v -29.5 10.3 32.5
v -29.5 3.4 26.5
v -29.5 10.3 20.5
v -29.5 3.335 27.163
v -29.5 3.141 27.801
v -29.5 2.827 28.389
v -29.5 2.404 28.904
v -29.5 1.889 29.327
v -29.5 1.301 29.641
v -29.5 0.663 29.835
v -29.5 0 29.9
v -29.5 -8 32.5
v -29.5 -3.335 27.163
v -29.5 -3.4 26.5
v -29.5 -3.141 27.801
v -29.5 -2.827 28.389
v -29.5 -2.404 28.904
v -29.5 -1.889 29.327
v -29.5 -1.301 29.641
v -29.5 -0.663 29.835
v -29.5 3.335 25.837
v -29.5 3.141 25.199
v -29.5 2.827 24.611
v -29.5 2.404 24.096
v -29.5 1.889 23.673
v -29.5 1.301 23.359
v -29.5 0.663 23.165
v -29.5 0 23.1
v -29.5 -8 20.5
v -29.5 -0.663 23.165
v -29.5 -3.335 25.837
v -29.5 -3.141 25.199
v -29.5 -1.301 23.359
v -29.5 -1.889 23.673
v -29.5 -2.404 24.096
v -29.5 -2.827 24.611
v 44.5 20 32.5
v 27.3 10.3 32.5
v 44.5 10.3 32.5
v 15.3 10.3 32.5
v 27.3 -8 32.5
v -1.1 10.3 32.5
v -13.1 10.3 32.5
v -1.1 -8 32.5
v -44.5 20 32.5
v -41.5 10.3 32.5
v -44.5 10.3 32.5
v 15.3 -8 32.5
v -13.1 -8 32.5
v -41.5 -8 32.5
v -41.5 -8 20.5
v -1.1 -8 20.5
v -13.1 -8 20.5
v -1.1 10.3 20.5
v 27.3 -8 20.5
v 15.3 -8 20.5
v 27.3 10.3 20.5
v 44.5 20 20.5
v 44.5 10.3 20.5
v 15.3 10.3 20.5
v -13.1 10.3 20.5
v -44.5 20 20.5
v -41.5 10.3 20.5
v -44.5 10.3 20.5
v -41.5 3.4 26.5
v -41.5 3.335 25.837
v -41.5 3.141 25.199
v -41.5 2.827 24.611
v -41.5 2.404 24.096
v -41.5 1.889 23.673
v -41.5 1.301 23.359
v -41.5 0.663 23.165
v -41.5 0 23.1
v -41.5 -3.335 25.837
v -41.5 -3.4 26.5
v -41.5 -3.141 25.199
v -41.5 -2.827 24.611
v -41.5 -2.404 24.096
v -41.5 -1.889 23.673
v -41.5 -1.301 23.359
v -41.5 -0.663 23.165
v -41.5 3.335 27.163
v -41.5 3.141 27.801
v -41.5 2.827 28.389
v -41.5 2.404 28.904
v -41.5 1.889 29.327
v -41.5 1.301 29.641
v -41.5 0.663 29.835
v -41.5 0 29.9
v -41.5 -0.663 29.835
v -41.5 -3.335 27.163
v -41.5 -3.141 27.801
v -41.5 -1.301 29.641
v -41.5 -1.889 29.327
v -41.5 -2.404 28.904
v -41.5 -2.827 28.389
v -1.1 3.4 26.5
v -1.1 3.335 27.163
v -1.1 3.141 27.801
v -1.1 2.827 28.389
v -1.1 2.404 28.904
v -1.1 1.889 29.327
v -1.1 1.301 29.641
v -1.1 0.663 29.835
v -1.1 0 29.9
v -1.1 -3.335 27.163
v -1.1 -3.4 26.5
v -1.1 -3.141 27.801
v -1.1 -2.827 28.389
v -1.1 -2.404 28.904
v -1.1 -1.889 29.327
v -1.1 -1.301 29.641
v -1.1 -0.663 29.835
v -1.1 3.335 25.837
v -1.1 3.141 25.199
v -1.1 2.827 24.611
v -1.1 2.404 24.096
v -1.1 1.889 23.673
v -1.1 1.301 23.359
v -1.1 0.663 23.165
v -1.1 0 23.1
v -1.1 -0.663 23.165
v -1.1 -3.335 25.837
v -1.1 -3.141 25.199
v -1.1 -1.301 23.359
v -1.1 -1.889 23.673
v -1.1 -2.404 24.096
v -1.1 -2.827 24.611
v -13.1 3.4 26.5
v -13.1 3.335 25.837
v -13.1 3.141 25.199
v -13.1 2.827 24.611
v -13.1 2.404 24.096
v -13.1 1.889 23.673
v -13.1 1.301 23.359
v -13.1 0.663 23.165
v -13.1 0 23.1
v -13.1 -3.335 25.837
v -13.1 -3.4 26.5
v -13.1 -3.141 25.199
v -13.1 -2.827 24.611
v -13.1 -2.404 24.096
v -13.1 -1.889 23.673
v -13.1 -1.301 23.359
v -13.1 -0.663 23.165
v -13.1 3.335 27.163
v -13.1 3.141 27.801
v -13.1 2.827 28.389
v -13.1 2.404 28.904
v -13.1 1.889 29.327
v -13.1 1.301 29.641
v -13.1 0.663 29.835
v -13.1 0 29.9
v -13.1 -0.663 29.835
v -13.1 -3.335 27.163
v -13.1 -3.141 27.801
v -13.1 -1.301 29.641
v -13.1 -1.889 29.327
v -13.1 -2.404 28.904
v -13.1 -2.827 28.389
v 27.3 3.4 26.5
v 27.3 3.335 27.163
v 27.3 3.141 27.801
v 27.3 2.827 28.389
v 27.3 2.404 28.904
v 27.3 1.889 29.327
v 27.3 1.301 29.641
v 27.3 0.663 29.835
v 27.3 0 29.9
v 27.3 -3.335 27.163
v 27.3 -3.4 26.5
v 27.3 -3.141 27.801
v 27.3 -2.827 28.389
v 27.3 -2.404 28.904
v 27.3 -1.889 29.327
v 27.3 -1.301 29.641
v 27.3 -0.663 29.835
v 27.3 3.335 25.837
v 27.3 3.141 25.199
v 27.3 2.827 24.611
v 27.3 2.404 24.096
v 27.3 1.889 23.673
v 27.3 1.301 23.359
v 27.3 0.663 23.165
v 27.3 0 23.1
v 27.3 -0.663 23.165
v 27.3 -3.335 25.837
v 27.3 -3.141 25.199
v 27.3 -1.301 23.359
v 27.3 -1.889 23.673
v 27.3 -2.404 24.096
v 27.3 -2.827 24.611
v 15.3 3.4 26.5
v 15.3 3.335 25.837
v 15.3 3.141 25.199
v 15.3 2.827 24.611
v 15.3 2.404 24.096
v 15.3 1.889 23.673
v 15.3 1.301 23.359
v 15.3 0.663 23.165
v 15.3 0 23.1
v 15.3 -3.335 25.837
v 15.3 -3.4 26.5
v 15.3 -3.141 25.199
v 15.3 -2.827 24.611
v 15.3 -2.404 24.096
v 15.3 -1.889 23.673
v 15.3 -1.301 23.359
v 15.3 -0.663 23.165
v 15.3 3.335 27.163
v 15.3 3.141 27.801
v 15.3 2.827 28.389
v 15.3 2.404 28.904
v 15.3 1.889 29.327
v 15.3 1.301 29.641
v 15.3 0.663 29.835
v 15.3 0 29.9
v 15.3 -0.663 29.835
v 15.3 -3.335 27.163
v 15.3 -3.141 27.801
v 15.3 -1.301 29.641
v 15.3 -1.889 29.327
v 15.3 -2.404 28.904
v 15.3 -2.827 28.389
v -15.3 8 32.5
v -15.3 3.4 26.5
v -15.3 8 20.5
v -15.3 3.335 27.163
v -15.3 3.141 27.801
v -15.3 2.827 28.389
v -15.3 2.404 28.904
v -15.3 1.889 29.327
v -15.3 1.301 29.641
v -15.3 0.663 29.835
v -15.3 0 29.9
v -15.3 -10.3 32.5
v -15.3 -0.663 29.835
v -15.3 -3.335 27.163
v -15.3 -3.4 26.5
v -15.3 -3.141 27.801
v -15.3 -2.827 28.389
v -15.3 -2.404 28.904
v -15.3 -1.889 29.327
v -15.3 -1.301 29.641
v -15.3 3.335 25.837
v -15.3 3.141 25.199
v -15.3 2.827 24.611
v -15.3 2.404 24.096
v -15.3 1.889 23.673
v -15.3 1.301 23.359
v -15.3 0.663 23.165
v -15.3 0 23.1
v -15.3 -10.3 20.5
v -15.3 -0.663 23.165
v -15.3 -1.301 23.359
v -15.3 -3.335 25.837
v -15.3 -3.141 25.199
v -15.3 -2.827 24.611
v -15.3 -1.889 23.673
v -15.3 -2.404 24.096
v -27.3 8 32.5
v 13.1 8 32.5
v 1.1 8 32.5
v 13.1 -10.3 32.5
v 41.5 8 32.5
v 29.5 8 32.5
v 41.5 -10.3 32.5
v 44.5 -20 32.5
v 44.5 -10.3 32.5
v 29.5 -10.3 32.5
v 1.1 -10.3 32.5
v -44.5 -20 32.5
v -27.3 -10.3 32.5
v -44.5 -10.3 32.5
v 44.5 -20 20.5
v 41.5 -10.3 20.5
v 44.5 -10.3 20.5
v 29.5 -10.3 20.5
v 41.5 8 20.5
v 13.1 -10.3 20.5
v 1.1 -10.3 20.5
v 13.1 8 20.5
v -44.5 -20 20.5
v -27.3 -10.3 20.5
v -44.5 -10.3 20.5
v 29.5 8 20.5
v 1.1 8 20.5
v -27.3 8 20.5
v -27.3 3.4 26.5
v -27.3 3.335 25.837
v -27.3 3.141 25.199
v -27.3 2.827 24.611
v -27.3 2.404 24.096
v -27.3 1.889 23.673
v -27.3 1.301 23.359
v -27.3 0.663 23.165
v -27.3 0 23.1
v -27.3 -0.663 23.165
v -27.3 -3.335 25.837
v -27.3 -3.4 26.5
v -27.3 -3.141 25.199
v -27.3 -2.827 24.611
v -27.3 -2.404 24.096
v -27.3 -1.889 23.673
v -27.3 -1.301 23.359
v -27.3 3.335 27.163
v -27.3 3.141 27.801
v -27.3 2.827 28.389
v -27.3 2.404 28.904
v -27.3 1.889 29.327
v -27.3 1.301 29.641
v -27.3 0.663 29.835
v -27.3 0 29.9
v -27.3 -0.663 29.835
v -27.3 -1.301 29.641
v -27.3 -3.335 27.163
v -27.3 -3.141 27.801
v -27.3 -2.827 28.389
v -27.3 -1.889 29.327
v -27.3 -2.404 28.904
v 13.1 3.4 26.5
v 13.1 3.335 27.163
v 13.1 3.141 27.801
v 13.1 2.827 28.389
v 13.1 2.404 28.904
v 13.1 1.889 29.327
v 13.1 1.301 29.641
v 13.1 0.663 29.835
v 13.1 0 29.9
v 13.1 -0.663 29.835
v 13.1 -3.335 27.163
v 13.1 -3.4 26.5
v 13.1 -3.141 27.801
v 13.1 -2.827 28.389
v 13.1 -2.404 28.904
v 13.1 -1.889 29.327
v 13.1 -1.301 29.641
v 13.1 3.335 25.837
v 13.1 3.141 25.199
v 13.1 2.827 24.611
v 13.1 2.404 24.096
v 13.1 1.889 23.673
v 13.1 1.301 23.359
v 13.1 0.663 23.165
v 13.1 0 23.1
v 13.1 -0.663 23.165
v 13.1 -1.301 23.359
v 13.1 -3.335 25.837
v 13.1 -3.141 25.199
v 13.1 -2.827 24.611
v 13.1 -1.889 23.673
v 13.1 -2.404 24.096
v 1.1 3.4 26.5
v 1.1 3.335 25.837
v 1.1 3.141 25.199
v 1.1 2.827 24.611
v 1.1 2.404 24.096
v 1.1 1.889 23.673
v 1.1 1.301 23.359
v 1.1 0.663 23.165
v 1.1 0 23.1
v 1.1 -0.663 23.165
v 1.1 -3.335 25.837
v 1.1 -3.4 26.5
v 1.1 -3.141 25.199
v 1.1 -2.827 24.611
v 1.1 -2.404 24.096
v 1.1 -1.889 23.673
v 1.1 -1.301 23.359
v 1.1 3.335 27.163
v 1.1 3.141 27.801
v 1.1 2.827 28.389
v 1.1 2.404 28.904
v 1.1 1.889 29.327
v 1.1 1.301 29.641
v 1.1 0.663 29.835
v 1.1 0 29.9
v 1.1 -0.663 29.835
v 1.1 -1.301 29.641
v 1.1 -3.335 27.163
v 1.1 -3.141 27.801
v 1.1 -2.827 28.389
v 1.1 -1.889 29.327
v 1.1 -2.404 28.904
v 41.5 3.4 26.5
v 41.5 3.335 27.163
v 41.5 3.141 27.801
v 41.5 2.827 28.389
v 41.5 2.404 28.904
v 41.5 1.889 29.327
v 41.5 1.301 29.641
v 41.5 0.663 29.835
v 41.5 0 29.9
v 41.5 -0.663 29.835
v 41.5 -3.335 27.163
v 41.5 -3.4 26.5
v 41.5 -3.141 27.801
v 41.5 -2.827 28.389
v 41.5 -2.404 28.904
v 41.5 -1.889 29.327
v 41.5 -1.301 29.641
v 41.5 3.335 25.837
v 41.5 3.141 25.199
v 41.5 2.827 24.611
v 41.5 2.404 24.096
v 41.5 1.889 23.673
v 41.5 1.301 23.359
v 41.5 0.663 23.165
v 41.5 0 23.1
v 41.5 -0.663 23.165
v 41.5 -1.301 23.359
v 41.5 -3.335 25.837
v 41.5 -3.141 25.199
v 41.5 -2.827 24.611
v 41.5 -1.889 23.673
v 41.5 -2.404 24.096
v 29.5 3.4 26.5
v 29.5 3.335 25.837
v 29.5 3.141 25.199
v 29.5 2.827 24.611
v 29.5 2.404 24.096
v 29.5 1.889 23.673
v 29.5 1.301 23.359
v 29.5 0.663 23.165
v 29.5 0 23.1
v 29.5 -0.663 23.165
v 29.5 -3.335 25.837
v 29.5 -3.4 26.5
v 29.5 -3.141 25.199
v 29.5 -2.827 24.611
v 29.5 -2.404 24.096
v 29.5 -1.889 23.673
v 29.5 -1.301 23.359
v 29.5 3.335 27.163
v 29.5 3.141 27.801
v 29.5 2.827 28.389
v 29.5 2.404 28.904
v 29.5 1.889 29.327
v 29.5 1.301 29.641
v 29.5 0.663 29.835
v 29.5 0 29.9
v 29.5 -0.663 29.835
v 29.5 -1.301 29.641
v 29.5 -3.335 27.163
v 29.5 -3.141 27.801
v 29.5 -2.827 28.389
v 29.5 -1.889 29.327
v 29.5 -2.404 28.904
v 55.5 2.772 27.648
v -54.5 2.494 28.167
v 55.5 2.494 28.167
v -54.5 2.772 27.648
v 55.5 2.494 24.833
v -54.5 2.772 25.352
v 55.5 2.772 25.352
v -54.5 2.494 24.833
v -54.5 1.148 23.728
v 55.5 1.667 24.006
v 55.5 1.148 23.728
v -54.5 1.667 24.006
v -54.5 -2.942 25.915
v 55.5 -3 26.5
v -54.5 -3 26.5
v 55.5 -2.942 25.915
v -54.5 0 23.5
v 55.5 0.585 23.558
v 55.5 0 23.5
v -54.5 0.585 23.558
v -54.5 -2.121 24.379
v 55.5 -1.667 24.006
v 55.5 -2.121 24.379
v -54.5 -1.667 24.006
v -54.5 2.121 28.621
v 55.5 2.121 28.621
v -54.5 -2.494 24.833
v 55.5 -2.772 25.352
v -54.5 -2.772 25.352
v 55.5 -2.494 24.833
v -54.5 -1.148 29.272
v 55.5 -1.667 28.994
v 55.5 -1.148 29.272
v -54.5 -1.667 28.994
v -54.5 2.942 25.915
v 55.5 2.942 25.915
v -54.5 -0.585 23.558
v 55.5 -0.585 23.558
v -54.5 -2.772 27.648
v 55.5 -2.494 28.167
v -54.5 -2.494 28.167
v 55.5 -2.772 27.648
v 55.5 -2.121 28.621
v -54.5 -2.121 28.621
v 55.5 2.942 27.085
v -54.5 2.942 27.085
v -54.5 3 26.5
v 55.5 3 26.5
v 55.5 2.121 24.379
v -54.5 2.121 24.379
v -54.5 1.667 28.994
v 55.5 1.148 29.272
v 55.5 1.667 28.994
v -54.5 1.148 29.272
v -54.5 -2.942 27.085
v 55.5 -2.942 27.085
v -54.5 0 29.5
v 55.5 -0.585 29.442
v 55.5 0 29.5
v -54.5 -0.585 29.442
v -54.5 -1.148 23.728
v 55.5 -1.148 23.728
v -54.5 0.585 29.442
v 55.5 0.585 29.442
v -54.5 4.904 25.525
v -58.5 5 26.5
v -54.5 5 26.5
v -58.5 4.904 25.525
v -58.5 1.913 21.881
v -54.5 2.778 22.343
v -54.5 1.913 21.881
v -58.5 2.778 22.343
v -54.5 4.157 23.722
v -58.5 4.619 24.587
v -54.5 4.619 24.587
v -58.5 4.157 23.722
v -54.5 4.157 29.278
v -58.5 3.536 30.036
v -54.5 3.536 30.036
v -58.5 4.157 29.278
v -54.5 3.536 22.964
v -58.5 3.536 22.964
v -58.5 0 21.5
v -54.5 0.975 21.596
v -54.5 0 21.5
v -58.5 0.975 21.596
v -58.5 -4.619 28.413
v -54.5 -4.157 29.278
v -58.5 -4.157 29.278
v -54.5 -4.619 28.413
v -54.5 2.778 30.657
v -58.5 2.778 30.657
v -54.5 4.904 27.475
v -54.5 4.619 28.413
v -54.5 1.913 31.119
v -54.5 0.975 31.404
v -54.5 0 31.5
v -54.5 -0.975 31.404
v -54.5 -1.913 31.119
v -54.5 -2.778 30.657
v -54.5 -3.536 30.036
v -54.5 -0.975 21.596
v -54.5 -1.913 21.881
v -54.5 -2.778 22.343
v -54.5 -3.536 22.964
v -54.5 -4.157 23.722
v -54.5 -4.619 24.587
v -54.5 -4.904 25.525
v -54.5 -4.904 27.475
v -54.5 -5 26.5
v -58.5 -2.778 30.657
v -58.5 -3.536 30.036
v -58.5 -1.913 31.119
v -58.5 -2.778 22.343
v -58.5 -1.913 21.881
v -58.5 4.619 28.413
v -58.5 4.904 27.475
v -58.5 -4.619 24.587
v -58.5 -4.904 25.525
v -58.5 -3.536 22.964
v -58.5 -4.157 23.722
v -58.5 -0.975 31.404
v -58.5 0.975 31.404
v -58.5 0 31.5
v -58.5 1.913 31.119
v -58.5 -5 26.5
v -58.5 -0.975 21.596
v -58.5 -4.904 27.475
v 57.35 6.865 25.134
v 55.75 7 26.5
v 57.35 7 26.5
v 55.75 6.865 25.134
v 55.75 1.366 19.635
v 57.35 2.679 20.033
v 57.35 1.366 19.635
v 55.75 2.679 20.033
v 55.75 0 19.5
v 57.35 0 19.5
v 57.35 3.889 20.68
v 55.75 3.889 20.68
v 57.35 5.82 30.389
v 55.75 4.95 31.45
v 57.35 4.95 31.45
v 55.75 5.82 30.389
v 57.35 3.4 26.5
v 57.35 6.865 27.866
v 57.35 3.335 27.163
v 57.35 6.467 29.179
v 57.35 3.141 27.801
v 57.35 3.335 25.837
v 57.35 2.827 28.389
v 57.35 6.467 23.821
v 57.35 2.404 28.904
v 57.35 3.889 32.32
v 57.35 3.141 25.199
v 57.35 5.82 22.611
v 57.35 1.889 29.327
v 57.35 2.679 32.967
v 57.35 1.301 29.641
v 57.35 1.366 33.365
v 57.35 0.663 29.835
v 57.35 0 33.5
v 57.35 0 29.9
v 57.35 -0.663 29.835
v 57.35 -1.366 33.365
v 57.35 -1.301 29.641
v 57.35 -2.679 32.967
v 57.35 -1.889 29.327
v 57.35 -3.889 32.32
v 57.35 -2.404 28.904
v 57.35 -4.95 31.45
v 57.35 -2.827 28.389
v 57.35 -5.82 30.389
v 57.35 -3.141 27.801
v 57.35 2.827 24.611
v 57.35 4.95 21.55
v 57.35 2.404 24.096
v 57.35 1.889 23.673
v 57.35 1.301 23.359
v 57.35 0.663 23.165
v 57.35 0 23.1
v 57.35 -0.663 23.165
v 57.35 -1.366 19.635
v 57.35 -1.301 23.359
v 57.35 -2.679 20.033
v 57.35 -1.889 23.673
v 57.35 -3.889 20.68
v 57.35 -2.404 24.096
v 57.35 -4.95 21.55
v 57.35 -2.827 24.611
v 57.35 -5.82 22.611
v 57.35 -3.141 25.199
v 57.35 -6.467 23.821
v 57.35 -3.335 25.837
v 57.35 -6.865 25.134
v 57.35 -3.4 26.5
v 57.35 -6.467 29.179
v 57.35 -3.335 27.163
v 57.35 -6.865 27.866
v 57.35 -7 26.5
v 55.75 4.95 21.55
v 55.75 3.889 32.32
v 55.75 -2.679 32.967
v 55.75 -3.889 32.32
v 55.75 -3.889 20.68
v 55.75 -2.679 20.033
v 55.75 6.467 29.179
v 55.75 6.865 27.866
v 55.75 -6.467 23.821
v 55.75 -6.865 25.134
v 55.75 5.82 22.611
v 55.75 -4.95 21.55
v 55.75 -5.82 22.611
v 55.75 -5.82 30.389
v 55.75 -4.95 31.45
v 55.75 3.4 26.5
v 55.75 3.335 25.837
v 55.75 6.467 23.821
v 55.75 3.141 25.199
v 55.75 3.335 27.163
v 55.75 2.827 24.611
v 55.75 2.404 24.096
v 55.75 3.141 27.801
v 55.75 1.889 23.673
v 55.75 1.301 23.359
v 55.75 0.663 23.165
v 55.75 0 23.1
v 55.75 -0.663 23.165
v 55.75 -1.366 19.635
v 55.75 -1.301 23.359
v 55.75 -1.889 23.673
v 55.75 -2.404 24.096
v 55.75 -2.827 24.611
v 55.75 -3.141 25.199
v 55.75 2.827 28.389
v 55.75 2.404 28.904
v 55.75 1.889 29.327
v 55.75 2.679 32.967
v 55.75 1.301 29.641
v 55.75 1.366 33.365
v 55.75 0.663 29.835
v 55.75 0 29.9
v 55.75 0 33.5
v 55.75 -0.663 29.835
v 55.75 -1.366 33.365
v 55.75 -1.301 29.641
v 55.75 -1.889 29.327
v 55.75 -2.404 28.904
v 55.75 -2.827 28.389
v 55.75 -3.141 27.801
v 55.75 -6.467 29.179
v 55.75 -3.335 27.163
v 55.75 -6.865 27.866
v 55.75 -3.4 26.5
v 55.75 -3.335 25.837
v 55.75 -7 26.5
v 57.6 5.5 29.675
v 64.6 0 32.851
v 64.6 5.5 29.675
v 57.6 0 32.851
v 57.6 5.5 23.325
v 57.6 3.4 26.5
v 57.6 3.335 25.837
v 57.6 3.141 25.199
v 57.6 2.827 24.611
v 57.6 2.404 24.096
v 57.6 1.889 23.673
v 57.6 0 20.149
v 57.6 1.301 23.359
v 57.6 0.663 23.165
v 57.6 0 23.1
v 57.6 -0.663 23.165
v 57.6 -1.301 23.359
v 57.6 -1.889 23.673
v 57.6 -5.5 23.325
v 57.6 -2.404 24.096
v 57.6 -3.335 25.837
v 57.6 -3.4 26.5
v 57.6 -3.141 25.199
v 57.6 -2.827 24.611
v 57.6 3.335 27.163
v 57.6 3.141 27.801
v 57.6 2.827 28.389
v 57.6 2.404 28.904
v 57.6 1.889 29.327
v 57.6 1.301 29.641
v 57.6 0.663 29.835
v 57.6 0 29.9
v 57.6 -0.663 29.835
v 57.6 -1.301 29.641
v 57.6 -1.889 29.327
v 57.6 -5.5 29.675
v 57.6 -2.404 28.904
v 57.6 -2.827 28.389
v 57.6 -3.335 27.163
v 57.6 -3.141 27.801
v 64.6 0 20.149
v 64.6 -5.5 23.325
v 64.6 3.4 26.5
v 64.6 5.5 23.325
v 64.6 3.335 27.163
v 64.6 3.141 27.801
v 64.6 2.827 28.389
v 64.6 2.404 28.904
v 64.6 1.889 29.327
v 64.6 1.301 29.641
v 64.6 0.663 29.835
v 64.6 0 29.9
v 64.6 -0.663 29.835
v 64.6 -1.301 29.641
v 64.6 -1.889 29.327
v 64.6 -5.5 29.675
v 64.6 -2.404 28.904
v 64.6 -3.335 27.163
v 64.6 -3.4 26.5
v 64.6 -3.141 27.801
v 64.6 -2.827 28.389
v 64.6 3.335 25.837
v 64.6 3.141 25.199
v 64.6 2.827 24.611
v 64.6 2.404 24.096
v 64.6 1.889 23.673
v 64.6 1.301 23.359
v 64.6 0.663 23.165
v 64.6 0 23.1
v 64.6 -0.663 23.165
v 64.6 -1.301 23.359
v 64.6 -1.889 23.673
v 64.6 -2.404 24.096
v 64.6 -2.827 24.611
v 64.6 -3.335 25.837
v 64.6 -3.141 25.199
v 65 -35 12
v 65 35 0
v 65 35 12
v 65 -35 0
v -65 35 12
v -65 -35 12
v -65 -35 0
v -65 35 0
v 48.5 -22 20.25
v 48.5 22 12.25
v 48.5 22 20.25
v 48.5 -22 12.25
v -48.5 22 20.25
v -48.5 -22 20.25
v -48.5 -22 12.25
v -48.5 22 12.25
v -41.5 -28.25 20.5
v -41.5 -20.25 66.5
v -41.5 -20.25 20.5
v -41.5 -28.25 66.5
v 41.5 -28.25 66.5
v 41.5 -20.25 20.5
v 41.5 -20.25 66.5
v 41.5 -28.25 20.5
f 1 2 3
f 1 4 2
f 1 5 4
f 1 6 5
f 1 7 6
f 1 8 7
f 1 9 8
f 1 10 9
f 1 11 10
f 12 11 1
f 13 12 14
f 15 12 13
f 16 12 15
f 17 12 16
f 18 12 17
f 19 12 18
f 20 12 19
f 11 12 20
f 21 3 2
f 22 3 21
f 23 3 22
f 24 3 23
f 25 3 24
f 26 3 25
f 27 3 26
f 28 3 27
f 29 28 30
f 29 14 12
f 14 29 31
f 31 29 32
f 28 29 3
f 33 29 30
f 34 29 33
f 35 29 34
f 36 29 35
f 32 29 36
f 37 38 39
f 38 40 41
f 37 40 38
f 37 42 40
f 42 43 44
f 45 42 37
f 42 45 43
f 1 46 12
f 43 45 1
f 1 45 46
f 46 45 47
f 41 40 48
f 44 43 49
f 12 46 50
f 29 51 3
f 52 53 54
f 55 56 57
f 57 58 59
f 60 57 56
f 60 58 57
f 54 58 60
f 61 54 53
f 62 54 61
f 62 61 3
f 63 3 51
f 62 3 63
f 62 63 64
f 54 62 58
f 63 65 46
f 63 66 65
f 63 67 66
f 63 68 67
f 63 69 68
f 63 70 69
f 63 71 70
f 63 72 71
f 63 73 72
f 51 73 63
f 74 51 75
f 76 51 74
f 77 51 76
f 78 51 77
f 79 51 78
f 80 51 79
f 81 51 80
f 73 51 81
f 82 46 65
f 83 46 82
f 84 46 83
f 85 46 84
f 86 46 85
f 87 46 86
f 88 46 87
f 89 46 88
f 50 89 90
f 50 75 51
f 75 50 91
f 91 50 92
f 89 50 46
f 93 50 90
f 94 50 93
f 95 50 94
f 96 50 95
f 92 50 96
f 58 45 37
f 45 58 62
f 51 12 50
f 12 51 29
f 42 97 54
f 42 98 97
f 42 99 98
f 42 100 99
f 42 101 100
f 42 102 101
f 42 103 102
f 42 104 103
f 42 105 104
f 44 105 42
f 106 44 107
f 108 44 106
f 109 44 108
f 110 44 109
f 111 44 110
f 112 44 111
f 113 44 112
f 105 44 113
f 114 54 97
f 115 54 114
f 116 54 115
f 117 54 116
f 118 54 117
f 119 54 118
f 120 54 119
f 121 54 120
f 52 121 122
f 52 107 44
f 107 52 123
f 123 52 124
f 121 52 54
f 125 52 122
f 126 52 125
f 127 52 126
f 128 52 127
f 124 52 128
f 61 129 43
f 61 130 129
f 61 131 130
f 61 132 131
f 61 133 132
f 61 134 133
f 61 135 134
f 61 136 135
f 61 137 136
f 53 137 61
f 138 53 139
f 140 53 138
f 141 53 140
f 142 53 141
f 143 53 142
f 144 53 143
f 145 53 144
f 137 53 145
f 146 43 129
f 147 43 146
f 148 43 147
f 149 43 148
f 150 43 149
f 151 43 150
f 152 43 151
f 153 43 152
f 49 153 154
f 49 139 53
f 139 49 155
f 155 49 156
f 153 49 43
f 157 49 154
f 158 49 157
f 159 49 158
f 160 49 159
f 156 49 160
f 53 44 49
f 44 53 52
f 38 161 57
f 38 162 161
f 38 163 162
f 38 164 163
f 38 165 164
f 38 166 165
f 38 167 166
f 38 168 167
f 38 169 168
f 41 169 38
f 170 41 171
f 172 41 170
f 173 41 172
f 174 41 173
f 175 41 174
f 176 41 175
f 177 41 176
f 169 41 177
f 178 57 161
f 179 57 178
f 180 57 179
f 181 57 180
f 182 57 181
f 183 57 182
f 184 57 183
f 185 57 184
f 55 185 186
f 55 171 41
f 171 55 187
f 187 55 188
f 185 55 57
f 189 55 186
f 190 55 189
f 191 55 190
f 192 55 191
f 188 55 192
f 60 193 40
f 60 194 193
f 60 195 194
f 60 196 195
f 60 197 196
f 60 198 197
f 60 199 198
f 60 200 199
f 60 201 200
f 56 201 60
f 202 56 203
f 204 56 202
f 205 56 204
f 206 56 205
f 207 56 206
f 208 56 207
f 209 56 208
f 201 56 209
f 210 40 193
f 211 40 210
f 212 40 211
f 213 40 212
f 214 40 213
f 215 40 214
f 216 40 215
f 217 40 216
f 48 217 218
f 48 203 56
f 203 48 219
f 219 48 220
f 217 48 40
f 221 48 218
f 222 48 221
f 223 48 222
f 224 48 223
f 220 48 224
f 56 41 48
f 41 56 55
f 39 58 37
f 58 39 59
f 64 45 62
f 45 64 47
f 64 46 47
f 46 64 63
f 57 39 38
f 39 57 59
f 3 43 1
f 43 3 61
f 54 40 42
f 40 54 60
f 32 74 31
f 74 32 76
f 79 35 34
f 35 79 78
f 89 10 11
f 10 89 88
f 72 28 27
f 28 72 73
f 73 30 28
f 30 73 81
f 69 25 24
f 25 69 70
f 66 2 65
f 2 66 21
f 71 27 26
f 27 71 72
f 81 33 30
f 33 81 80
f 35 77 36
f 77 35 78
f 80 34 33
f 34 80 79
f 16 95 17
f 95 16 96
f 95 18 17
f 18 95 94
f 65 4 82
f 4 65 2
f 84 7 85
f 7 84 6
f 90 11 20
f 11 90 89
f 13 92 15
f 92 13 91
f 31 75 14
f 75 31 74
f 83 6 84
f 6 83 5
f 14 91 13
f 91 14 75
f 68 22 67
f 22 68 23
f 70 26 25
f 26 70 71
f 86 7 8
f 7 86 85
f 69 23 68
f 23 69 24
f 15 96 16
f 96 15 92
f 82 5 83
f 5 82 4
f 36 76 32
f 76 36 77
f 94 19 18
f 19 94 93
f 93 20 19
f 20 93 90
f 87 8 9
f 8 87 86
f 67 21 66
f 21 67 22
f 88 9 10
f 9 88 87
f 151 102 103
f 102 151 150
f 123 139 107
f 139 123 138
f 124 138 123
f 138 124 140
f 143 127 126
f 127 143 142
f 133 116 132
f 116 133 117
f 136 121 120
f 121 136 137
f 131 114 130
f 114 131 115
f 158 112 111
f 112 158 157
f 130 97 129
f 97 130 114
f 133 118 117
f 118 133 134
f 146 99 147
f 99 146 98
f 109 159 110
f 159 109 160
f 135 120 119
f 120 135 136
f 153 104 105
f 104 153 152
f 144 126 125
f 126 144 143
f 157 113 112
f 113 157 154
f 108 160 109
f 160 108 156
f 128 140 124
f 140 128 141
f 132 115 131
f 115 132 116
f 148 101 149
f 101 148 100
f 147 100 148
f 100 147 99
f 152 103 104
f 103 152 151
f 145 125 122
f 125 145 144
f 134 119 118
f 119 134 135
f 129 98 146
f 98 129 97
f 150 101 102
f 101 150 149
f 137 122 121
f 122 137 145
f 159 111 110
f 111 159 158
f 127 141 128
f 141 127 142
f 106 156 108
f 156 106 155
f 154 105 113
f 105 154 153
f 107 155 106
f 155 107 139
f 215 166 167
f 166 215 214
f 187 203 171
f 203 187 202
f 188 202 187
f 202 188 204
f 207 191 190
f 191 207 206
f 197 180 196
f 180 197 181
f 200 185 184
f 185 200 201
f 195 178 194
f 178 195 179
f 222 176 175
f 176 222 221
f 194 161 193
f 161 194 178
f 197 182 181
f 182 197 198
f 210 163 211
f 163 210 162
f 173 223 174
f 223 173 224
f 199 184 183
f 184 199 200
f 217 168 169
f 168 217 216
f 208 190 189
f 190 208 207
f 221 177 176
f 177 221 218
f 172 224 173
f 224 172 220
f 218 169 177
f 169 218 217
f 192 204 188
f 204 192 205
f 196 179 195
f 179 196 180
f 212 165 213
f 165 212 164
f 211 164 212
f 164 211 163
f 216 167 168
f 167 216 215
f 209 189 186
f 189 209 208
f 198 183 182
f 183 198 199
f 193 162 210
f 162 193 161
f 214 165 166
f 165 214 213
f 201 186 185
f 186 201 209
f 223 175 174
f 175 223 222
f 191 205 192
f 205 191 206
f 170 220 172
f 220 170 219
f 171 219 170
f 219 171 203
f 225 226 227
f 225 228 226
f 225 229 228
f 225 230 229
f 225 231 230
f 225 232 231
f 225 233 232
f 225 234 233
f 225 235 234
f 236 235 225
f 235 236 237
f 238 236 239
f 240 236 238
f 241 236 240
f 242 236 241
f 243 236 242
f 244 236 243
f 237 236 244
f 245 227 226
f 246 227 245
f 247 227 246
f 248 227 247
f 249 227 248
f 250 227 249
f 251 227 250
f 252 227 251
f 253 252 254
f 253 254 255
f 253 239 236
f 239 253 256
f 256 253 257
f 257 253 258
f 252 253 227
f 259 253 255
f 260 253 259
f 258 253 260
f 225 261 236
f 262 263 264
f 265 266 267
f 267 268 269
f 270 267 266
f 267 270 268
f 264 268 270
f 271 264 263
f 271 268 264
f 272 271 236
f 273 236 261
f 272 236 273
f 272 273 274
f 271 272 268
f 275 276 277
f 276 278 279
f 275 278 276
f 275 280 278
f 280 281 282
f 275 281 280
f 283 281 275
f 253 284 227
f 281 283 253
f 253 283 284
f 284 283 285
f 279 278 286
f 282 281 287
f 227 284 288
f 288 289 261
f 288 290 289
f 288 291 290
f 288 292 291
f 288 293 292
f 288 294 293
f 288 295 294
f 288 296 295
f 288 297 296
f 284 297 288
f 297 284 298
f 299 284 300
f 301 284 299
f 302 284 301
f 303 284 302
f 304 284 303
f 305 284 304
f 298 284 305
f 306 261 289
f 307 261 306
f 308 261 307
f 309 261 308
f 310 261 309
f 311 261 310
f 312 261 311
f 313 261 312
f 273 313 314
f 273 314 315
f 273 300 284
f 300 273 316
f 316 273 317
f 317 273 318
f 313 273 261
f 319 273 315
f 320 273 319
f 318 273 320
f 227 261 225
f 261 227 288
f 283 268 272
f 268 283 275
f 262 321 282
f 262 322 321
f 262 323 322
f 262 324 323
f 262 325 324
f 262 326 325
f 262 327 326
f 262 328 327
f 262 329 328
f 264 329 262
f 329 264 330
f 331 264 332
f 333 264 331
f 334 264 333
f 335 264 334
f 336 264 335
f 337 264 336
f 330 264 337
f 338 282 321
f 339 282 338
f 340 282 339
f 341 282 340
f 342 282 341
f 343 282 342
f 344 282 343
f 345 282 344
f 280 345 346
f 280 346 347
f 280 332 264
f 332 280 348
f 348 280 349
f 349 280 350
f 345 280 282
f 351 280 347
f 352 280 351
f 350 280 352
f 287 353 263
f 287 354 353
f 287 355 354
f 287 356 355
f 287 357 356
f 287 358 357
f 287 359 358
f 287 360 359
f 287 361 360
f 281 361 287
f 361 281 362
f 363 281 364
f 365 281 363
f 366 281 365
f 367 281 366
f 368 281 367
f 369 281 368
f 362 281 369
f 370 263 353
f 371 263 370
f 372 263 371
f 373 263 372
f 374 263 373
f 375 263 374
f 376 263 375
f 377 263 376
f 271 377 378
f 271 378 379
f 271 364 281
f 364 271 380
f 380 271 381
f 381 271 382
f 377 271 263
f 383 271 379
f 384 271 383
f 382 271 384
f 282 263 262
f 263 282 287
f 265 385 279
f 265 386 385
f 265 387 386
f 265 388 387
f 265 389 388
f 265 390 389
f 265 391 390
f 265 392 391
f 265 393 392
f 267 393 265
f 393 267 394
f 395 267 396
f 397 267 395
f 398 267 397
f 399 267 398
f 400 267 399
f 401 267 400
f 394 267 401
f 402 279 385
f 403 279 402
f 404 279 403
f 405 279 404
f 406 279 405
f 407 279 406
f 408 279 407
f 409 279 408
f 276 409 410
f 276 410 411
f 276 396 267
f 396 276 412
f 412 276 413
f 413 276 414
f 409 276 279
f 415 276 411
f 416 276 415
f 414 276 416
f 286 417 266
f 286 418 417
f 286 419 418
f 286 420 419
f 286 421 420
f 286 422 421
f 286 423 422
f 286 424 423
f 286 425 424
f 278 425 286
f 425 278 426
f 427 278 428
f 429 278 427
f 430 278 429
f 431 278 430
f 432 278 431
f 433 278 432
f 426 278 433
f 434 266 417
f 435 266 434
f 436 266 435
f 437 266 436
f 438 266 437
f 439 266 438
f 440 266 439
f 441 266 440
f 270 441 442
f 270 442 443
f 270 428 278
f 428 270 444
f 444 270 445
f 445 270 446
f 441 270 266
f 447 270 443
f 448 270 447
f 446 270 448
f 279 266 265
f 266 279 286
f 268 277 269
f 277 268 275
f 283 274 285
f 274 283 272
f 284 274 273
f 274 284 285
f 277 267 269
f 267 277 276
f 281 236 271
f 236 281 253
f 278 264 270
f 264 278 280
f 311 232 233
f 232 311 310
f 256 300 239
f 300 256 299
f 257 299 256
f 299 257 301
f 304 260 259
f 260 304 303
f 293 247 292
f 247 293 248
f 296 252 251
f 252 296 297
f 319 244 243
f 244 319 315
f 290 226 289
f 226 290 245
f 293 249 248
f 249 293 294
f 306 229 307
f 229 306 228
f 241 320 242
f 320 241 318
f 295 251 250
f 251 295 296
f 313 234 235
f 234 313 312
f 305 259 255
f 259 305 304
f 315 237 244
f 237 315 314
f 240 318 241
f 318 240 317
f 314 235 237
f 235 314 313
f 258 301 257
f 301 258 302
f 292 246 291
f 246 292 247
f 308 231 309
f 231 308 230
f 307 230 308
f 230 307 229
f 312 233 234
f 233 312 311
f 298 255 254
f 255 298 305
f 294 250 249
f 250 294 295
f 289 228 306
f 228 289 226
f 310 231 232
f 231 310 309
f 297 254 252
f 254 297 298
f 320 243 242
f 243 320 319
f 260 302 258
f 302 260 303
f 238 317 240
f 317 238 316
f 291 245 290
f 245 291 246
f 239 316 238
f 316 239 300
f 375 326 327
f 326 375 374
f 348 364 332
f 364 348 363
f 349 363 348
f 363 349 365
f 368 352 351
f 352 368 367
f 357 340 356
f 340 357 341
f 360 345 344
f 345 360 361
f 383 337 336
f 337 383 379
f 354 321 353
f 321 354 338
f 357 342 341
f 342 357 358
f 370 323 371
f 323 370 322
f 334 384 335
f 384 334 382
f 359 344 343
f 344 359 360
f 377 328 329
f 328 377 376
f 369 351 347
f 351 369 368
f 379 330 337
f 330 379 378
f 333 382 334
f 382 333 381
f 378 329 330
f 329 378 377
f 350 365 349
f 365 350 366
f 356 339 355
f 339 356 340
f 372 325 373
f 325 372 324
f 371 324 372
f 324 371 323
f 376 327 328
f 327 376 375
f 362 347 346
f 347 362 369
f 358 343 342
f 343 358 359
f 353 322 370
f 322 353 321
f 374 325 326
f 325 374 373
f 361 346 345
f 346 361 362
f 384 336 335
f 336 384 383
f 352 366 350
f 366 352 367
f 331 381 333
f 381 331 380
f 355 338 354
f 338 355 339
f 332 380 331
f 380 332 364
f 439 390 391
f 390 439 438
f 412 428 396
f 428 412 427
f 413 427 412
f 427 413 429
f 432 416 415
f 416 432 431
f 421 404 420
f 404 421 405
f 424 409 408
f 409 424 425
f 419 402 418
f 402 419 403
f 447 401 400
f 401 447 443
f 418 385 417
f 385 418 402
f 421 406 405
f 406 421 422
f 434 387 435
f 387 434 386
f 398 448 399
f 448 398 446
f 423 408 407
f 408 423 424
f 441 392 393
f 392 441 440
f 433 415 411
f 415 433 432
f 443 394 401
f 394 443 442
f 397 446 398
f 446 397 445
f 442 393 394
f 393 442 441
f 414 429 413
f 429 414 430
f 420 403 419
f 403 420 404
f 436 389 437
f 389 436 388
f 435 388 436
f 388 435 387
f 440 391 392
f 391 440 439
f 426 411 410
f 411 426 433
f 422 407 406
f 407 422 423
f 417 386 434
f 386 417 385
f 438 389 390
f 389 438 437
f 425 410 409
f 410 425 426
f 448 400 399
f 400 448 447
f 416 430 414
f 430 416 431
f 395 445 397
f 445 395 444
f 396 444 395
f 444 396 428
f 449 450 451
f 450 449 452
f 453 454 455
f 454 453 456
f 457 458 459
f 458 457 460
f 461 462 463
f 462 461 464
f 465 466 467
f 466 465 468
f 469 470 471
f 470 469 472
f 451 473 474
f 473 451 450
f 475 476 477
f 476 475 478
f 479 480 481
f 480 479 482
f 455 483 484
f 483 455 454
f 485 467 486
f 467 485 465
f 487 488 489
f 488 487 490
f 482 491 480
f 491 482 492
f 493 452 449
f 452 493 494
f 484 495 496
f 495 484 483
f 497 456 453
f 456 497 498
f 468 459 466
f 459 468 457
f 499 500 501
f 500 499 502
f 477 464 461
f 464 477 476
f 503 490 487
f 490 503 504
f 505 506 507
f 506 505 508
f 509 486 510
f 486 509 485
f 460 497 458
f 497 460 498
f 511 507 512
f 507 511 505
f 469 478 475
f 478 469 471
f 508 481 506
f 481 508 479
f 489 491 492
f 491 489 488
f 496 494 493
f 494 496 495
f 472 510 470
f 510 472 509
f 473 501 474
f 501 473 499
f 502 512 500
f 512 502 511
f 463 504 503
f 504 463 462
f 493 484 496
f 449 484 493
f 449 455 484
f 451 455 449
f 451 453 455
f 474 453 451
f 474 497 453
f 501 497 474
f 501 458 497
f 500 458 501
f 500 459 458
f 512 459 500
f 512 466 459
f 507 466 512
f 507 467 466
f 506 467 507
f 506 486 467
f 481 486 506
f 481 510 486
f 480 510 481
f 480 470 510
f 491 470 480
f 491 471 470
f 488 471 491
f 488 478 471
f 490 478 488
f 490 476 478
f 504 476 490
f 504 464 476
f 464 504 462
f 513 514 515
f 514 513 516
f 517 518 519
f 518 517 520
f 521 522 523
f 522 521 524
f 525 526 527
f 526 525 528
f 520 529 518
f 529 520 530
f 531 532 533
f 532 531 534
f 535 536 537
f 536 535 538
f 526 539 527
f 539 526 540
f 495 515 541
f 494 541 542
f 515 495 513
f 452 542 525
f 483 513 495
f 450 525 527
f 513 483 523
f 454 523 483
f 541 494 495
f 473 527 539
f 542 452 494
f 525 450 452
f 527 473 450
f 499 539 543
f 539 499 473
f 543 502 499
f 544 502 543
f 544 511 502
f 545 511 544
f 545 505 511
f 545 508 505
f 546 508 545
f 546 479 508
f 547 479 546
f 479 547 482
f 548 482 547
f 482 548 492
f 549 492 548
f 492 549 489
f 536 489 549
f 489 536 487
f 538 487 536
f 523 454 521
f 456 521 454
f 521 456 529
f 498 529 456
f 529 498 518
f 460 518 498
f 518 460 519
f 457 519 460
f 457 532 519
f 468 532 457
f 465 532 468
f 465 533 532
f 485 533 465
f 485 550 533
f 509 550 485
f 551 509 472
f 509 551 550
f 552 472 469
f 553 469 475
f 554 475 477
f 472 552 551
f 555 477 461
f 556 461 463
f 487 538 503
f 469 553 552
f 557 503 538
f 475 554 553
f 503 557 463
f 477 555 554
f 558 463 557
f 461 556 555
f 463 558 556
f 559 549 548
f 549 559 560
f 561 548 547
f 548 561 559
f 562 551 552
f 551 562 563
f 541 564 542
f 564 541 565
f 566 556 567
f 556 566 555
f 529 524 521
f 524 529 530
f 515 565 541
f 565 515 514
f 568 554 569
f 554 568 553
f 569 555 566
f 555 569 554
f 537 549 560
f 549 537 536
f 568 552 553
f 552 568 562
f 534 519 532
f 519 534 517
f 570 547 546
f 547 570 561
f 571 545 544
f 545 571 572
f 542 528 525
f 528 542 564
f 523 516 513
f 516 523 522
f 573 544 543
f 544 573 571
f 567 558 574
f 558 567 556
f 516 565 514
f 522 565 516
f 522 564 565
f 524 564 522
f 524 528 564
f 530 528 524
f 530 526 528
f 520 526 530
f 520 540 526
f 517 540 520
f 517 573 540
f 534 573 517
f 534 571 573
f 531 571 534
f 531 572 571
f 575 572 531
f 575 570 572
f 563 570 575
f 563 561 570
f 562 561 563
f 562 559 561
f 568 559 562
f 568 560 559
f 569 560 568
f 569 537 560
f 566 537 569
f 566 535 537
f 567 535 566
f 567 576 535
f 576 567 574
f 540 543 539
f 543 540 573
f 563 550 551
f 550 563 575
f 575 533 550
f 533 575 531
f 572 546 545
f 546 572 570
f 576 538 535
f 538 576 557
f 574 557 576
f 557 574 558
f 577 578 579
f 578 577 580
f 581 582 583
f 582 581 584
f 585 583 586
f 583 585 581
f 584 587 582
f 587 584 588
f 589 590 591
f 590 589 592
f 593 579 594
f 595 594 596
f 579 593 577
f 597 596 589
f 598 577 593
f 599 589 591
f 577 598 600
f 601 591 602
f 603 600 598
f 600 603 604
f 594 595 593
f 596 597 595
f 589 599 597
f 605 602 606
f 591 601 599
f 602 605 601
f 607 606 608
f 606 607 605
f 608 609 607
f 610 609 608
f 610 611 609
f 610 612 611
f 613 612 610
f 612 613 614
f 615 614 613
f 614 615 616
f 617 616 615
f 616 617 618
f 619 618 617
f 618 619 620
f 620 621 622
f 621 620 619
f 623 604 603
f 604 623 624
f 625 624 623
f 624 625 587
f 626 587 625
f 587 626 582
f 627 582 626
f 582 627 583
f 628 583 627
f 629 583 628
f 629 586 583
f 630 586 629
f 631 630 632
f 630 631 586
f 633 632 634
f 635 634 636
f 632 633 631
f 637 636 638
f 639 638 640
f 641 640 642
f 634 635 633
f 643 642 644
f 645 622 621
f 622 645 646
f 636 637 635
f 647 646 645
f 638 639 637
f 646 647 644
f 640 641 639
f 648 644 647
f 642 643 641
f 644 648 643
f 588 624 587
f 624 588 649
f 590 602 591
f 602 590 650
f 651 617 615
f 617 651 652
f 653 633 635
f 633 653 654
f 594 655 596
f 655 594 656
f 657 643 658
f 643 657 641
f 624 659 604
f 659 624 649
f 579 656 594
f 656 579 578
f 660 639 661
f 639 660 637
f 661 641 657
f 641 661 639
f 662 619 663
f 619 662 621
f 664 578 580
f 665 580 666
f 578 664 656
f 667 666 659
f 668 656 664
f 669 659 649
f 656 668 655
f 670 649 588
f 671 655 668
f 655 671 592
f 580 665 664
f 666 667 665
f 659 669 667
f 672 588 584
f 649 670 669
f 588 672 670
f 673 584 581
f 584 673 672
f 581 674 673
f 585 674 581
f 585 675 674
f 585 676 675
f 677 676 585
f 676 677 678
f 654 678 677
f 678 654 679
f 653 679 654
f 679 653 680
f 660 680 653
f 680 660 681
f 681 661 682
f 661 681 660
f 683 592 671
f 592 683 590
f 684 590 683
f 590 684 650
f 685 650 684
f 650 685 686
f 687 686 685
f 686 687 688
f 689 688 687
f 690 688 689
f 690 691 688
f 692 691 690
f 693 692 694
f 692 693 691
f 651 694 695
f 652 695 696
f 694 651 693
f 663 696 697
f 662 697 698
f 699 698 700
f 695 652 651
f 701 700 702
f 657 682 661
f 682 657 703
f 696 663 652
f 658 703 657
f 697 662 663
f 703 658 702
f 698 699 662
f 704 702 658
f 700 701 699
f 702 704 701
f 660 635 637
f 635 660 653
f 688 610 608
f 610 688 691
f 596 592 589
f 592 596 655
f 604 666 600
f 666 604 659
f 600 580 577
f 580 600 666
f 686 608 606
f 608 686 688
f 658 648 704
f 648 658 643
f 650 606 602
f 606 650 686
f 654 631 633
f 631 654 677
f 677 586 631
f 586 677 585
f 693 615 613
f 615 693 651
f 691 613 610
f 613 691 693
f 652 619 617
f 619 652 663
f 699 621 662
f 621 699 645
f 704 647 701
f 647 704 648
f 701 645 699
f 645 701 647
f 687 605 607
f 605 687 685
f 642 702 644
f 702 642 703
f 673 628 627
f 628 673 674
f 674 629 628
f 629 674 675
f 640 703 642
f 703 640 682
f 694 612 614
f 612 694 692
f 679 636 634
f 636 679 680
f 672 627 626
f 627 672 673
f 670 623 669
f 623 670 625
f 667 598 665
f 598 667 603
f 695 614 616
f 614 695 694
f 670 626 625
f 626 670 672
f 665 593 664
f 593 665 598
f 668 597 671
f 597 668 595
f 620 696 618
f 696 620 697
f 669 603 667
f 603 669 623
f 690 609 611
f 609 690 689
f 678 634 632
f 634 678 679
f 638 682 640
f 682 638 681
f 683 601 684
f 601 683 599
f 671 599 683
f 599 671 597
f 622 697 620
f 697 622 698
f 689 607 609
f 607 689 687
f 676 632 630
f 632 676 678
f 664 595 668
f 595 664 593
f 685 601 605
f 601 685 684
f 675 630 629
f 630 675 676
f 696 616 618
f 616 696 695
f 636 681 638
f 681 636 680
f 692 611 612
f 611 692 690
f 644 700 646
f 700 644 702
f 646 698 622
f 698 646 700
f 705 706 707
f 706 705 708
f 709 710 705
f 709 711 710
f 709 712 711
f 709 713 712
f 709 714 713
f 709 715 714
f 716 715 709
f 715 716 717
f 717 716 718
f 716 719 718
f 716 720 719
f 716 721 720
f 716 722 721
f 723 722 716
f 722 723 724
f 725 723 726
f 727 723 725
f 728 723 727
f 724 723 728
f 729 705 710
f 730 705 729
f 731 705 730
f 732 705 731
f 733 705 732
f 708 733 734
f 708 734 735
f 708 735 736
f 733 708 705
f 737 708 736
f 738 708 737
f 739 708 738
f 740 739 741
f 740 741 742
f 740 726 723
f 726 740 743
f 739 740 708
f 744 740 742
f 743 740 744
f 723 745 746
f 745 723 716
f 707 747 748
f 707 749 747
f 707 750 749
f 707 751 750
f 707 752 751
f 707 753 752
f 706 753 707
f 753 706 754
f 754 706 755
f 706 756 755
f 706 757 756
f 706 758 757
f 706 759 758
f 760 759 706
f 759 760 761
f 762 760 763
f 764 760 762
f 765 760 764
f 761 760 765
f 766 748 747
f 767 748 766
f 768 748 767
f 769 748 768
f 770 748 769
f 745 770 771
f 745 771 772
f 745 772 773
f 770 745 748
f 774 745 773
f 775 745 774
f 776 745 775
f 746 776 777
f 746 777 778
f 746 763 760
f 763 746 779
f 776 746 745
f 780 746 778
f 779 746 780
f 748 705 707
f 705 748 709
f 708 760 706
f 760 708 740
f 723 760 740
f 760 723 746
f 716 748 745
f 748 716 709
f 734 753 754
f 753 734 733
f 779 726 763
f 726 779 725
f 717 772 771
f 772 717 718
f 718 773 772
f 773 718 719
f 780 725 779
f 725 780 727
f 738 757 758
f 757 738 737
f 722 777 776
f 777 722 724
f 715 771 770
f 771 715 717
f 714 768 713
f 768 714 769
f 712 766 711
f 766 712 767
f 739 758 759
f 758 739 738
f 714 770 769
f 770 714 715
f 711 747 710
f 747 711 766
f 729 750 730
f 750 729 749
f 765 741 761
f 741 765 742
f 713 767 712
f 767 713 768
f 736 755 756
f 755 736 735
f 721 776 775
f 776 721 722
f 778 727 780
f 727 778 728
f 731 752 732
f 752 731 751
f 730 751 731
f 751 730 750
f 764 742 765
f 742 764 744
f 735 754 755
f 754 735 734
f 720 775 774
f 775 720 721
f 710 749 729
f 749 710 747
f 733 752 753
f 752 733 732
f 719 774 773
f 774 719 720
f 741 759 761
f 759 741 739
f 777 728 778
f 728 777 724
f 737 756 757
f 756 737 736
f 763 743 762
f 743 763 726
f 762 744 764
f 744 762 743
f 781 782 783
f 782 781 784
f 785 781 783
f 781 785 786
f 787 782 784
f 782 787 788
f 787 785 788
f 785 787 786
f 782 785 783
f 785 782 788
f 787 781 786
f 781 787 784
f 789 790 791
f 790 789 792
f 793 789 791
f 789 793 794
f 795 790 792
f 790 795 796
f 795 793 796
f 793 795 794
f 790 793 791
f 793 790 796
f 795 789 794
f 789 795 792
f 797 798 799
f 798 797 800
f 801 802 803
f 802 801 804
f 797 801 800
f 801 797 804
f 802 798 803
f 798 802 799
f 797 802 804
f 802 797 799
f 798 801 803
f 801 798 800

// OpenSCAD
$fn = 32;

// ------------------------------------------------------------------------
// Comb hinge with flap: leaf 89 x 20 mm, pin d6, flap 46 mm
// Every part is its own module, assembly() places every instance.
// ------------------------------------------------------------------------

// --- part 1 ---
module hinge_bed() {
  difference() {
    translate([-65, -35, 0]) cube([130, 70, 12]);
  }
}

// --- part 2 ---
module hinge_riser() {
  difference() {
    translate([-48.5, -22, 0]) cube([97, 44, 8]);
  }
}

// --- part 3 ---
module hinge_leaf_a() {
  difference() {
    union() {
      translate([-41.5, -8, -6]) cube([12, 28, 12]);
      translate([-13.1, -8, -6]) cube([12, 28, 12]);
      translate([15.3, -8, -6]) cube([12, 28, 12]);
      translate([-44.5, 10.3, -6]) cube([89, 9.7, 12]);
    }
    translate([-35.5, 0, 0]) rotate([0, 90, 0]) cylinder(h = 14, d = 6.8, center = true);
    translate([-7.1, 0, 0]) rotate([0, 90, 0]) cylinder(h = 14, d = 6.8, center = true);
    translate([21.3, 0, 0]) rotate([0, 90, 0]) cylinder(h = 14, d = 6.8, center = true);
  }
}

// --- part 4 ---
module hinge_leaf_b() {
  difference() {
    union() {
      translate([-27.3, -20, -6]) cube([12, 28, 12]);
      translate([1.1, -20, -6]) cube([12, 28, 12]);
      translate([29.5, -20, -6]) cube([12, 28, 12]);
      translate([-44.5, -20, -6]) cube([89, 9.7, 12]);
    }
    translate([-21.3, 0, 0]) rotate([0, 90, 0]) cylinder(h = 14, d = 6.8, center = true);
    translate([7.1, 0, 0]) rotate([0, 90, 0]) cylinder(h = 14, d = 6.8, center = true);
    translate([35.5, 0, 0]) rotate([0, 90, 0]) cylinder(h = 14, d = 6.8, center = true);
  }
}

// --- part 5 ---
module hinge_flap() {
  difference() {
    translate([-41.5, -23, 0]) cube([83, 46, 8]);
  }
}

// --- part 6 ---
module hinge_pin() {
  rotate([0, 90, 0]) cylinder(h = 111, d = 6, center = true);
  translate([-58.5, 0, 0]) rotate([0, 90, 0]) cylinder(h = 4, d = 10);
}

// --- part 7 ---
module pin_washer() {
  difference() {
      translate([0, 0, 0]) cylinder(h = 1.6, d = 14);
      translate([0, 0, -1]) cylinder(h = 3.6, d = 6.8);
    }
}

// --- part 8 ---
module pin_nut() {
  difference() {
    linear_extrude(height = 7) polygon(points = [[6.351, 0], [3.175, 5.5], [-3.175, 5.5], [-6.351, 0], [-3.175, -5.5], [3.175, -5.5]]);
    translate([0, 0, -1]) cylinder(h = 9, d = 6.8);
  }
}

// --- assembly ---
module assembly() {
  color([0.80, 0.24, 0.20]) translate([0, 0, 0]) rotate([0, 0, 0]) hinge_bed();
  color([0.20, 0.45, 0.75]) translate([0, 0, 12.25]) rotate([0, 0, 0]) hinge_riser();
  color([0.25, 0.62, 0.32]) translate([0, 0, 26.5]) rotate([0, 0, 0]) hinge_leaf_a();
  color([0.92, 0.70, 0.18]) translate([0, 0, 26.5]) rotate([0, 0, 0]) hinge_leaf_b();
  color([0.58, 0.35, 0.70]) translate([0, -20.25, 43.5]) rotate([90, 0, 0]) hinge_flap();
  color([0.16, 0.66, 0.66]) translate([0, 0, 26.5]) rotate([0, 0, 0]) hinge_pin();
  color([0.85, 0.48, 0.18]) translate([55.75, 0, 26.5]) rotate([0, 90, 0]) pin_washer();
  color([0.55, 0.60, 0.65]) translate([57.6, 0, 26.5]) rotate([0, 90, 0]) pin_nut();
}

assembly();
